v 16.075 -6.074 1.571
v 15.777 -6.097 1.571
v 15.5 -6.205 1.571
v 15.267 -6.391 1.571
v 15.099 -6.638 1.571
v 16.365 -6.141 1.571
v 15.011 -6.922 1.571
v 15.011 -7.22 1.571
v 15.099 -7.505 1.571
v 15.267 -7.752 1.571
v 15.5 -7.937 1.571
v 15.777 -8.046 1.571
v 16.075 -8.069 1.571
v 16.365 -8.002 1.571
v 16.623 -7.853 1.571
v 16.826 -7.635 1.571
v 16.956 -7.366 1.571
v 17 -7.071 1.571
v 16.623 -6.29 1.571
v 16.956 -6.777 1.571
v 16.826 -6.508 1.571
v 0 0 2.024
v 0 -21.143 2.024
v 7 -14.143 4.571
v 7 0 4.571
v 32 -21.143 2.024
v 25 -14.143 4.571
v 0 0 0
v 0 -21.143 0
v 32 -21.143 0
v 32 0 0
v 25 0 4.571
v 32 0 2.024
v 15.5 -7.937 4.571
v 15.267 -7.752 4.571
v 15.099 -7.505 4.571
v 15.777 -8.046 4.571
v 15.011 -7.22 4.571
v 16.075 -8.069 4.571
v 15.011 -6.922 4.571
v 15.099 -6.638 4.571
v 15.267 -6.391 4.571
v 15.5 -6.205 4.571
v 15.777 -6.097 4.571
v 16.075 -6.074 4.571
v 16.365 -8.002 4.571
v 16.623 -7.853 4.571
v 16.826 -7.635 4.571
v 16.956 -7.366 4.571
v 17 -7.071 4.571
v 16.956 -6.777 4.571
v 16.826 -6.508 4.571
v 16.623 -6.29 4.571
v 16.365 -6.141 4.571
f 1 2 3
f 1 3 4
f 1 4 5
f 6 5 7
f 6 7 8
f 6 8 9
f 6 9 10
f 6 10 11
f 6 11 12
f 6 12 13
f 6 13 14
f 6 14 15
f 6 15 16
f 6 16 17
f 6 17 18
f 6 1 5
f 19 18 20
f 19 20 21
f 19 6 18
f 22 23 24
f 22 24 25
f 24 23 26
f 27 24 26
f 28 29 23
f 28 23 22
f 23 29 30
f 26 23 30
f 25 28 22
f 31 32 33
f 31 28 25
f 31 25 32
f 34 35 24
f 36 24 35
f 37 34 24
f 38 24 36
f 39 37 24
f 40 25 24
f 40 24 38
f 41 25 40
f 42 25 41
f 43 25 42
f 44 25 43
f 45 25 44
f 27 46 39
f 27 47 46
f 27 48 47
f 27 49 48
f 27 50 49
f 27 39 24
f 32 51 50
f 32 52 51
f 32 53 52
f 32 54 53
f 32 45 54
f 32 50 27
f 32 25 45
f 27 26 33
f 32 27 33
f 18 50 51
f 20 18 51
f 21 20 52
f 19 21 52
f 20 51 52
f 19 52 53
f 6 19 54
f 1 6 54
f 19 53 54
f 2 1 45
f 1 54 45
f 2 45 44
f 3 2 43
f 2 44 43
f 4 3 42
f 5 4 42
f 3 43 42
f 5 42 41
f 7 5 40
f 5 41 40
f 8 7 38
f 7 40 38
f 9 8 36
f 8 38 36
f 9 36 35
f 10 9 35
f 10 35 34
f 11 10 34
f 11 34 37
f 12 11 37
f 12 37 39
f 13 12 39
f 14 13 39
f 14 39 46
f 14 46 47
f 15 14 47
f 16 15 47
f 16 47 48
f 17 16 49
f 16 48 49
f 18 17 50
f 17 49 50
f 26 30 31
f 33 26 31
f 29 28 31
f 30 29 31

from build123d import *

# Parameters (mm, degrees)
F1_W     = 32
F1_H     = 21.1428571429
F2_DEPTH = 4.5714285714
F3_SIZE2 = 2.5477916399
F3_SIZE  = 7
F4_R     = 1
F5_DEPTH = 3


with BuildPart() as f2:
    # F1 (on Top) → F2 (new body)
    with BuildSketch(Plane.XY):
        with Locations((16, -10.5714285714)):
            Rectangle(F1_W, F1_H)
    extrude(amount=F2_DEPTH)

    # F3
    f3_edges = [f2.edges().sort_by_distance(p)[0] for p in [
        (0, -10.571429, 4.571429),
        (16, -21.142857, 4.571429),
        (32, -10.571429, 4.571429),
    ]]
    f3_side = f2.faces().sort_by_distance((16, -10.571429, 4.571429))[0]
    chamfer(f3_edges, length=F3_SIZE, length2=F3_SIZE2, reference=f3_side)

    # F4 (on face) → F5 (cut)
    with BuildSketch(Plane.XY.offset(4.5714285714)):
        with Locations((16, -7.0714285714)):
            Circle(F4_R)
    extrude(amount=-F5_DEPTH, mode=Mode.SUBTRACT)


solid = f2.part
